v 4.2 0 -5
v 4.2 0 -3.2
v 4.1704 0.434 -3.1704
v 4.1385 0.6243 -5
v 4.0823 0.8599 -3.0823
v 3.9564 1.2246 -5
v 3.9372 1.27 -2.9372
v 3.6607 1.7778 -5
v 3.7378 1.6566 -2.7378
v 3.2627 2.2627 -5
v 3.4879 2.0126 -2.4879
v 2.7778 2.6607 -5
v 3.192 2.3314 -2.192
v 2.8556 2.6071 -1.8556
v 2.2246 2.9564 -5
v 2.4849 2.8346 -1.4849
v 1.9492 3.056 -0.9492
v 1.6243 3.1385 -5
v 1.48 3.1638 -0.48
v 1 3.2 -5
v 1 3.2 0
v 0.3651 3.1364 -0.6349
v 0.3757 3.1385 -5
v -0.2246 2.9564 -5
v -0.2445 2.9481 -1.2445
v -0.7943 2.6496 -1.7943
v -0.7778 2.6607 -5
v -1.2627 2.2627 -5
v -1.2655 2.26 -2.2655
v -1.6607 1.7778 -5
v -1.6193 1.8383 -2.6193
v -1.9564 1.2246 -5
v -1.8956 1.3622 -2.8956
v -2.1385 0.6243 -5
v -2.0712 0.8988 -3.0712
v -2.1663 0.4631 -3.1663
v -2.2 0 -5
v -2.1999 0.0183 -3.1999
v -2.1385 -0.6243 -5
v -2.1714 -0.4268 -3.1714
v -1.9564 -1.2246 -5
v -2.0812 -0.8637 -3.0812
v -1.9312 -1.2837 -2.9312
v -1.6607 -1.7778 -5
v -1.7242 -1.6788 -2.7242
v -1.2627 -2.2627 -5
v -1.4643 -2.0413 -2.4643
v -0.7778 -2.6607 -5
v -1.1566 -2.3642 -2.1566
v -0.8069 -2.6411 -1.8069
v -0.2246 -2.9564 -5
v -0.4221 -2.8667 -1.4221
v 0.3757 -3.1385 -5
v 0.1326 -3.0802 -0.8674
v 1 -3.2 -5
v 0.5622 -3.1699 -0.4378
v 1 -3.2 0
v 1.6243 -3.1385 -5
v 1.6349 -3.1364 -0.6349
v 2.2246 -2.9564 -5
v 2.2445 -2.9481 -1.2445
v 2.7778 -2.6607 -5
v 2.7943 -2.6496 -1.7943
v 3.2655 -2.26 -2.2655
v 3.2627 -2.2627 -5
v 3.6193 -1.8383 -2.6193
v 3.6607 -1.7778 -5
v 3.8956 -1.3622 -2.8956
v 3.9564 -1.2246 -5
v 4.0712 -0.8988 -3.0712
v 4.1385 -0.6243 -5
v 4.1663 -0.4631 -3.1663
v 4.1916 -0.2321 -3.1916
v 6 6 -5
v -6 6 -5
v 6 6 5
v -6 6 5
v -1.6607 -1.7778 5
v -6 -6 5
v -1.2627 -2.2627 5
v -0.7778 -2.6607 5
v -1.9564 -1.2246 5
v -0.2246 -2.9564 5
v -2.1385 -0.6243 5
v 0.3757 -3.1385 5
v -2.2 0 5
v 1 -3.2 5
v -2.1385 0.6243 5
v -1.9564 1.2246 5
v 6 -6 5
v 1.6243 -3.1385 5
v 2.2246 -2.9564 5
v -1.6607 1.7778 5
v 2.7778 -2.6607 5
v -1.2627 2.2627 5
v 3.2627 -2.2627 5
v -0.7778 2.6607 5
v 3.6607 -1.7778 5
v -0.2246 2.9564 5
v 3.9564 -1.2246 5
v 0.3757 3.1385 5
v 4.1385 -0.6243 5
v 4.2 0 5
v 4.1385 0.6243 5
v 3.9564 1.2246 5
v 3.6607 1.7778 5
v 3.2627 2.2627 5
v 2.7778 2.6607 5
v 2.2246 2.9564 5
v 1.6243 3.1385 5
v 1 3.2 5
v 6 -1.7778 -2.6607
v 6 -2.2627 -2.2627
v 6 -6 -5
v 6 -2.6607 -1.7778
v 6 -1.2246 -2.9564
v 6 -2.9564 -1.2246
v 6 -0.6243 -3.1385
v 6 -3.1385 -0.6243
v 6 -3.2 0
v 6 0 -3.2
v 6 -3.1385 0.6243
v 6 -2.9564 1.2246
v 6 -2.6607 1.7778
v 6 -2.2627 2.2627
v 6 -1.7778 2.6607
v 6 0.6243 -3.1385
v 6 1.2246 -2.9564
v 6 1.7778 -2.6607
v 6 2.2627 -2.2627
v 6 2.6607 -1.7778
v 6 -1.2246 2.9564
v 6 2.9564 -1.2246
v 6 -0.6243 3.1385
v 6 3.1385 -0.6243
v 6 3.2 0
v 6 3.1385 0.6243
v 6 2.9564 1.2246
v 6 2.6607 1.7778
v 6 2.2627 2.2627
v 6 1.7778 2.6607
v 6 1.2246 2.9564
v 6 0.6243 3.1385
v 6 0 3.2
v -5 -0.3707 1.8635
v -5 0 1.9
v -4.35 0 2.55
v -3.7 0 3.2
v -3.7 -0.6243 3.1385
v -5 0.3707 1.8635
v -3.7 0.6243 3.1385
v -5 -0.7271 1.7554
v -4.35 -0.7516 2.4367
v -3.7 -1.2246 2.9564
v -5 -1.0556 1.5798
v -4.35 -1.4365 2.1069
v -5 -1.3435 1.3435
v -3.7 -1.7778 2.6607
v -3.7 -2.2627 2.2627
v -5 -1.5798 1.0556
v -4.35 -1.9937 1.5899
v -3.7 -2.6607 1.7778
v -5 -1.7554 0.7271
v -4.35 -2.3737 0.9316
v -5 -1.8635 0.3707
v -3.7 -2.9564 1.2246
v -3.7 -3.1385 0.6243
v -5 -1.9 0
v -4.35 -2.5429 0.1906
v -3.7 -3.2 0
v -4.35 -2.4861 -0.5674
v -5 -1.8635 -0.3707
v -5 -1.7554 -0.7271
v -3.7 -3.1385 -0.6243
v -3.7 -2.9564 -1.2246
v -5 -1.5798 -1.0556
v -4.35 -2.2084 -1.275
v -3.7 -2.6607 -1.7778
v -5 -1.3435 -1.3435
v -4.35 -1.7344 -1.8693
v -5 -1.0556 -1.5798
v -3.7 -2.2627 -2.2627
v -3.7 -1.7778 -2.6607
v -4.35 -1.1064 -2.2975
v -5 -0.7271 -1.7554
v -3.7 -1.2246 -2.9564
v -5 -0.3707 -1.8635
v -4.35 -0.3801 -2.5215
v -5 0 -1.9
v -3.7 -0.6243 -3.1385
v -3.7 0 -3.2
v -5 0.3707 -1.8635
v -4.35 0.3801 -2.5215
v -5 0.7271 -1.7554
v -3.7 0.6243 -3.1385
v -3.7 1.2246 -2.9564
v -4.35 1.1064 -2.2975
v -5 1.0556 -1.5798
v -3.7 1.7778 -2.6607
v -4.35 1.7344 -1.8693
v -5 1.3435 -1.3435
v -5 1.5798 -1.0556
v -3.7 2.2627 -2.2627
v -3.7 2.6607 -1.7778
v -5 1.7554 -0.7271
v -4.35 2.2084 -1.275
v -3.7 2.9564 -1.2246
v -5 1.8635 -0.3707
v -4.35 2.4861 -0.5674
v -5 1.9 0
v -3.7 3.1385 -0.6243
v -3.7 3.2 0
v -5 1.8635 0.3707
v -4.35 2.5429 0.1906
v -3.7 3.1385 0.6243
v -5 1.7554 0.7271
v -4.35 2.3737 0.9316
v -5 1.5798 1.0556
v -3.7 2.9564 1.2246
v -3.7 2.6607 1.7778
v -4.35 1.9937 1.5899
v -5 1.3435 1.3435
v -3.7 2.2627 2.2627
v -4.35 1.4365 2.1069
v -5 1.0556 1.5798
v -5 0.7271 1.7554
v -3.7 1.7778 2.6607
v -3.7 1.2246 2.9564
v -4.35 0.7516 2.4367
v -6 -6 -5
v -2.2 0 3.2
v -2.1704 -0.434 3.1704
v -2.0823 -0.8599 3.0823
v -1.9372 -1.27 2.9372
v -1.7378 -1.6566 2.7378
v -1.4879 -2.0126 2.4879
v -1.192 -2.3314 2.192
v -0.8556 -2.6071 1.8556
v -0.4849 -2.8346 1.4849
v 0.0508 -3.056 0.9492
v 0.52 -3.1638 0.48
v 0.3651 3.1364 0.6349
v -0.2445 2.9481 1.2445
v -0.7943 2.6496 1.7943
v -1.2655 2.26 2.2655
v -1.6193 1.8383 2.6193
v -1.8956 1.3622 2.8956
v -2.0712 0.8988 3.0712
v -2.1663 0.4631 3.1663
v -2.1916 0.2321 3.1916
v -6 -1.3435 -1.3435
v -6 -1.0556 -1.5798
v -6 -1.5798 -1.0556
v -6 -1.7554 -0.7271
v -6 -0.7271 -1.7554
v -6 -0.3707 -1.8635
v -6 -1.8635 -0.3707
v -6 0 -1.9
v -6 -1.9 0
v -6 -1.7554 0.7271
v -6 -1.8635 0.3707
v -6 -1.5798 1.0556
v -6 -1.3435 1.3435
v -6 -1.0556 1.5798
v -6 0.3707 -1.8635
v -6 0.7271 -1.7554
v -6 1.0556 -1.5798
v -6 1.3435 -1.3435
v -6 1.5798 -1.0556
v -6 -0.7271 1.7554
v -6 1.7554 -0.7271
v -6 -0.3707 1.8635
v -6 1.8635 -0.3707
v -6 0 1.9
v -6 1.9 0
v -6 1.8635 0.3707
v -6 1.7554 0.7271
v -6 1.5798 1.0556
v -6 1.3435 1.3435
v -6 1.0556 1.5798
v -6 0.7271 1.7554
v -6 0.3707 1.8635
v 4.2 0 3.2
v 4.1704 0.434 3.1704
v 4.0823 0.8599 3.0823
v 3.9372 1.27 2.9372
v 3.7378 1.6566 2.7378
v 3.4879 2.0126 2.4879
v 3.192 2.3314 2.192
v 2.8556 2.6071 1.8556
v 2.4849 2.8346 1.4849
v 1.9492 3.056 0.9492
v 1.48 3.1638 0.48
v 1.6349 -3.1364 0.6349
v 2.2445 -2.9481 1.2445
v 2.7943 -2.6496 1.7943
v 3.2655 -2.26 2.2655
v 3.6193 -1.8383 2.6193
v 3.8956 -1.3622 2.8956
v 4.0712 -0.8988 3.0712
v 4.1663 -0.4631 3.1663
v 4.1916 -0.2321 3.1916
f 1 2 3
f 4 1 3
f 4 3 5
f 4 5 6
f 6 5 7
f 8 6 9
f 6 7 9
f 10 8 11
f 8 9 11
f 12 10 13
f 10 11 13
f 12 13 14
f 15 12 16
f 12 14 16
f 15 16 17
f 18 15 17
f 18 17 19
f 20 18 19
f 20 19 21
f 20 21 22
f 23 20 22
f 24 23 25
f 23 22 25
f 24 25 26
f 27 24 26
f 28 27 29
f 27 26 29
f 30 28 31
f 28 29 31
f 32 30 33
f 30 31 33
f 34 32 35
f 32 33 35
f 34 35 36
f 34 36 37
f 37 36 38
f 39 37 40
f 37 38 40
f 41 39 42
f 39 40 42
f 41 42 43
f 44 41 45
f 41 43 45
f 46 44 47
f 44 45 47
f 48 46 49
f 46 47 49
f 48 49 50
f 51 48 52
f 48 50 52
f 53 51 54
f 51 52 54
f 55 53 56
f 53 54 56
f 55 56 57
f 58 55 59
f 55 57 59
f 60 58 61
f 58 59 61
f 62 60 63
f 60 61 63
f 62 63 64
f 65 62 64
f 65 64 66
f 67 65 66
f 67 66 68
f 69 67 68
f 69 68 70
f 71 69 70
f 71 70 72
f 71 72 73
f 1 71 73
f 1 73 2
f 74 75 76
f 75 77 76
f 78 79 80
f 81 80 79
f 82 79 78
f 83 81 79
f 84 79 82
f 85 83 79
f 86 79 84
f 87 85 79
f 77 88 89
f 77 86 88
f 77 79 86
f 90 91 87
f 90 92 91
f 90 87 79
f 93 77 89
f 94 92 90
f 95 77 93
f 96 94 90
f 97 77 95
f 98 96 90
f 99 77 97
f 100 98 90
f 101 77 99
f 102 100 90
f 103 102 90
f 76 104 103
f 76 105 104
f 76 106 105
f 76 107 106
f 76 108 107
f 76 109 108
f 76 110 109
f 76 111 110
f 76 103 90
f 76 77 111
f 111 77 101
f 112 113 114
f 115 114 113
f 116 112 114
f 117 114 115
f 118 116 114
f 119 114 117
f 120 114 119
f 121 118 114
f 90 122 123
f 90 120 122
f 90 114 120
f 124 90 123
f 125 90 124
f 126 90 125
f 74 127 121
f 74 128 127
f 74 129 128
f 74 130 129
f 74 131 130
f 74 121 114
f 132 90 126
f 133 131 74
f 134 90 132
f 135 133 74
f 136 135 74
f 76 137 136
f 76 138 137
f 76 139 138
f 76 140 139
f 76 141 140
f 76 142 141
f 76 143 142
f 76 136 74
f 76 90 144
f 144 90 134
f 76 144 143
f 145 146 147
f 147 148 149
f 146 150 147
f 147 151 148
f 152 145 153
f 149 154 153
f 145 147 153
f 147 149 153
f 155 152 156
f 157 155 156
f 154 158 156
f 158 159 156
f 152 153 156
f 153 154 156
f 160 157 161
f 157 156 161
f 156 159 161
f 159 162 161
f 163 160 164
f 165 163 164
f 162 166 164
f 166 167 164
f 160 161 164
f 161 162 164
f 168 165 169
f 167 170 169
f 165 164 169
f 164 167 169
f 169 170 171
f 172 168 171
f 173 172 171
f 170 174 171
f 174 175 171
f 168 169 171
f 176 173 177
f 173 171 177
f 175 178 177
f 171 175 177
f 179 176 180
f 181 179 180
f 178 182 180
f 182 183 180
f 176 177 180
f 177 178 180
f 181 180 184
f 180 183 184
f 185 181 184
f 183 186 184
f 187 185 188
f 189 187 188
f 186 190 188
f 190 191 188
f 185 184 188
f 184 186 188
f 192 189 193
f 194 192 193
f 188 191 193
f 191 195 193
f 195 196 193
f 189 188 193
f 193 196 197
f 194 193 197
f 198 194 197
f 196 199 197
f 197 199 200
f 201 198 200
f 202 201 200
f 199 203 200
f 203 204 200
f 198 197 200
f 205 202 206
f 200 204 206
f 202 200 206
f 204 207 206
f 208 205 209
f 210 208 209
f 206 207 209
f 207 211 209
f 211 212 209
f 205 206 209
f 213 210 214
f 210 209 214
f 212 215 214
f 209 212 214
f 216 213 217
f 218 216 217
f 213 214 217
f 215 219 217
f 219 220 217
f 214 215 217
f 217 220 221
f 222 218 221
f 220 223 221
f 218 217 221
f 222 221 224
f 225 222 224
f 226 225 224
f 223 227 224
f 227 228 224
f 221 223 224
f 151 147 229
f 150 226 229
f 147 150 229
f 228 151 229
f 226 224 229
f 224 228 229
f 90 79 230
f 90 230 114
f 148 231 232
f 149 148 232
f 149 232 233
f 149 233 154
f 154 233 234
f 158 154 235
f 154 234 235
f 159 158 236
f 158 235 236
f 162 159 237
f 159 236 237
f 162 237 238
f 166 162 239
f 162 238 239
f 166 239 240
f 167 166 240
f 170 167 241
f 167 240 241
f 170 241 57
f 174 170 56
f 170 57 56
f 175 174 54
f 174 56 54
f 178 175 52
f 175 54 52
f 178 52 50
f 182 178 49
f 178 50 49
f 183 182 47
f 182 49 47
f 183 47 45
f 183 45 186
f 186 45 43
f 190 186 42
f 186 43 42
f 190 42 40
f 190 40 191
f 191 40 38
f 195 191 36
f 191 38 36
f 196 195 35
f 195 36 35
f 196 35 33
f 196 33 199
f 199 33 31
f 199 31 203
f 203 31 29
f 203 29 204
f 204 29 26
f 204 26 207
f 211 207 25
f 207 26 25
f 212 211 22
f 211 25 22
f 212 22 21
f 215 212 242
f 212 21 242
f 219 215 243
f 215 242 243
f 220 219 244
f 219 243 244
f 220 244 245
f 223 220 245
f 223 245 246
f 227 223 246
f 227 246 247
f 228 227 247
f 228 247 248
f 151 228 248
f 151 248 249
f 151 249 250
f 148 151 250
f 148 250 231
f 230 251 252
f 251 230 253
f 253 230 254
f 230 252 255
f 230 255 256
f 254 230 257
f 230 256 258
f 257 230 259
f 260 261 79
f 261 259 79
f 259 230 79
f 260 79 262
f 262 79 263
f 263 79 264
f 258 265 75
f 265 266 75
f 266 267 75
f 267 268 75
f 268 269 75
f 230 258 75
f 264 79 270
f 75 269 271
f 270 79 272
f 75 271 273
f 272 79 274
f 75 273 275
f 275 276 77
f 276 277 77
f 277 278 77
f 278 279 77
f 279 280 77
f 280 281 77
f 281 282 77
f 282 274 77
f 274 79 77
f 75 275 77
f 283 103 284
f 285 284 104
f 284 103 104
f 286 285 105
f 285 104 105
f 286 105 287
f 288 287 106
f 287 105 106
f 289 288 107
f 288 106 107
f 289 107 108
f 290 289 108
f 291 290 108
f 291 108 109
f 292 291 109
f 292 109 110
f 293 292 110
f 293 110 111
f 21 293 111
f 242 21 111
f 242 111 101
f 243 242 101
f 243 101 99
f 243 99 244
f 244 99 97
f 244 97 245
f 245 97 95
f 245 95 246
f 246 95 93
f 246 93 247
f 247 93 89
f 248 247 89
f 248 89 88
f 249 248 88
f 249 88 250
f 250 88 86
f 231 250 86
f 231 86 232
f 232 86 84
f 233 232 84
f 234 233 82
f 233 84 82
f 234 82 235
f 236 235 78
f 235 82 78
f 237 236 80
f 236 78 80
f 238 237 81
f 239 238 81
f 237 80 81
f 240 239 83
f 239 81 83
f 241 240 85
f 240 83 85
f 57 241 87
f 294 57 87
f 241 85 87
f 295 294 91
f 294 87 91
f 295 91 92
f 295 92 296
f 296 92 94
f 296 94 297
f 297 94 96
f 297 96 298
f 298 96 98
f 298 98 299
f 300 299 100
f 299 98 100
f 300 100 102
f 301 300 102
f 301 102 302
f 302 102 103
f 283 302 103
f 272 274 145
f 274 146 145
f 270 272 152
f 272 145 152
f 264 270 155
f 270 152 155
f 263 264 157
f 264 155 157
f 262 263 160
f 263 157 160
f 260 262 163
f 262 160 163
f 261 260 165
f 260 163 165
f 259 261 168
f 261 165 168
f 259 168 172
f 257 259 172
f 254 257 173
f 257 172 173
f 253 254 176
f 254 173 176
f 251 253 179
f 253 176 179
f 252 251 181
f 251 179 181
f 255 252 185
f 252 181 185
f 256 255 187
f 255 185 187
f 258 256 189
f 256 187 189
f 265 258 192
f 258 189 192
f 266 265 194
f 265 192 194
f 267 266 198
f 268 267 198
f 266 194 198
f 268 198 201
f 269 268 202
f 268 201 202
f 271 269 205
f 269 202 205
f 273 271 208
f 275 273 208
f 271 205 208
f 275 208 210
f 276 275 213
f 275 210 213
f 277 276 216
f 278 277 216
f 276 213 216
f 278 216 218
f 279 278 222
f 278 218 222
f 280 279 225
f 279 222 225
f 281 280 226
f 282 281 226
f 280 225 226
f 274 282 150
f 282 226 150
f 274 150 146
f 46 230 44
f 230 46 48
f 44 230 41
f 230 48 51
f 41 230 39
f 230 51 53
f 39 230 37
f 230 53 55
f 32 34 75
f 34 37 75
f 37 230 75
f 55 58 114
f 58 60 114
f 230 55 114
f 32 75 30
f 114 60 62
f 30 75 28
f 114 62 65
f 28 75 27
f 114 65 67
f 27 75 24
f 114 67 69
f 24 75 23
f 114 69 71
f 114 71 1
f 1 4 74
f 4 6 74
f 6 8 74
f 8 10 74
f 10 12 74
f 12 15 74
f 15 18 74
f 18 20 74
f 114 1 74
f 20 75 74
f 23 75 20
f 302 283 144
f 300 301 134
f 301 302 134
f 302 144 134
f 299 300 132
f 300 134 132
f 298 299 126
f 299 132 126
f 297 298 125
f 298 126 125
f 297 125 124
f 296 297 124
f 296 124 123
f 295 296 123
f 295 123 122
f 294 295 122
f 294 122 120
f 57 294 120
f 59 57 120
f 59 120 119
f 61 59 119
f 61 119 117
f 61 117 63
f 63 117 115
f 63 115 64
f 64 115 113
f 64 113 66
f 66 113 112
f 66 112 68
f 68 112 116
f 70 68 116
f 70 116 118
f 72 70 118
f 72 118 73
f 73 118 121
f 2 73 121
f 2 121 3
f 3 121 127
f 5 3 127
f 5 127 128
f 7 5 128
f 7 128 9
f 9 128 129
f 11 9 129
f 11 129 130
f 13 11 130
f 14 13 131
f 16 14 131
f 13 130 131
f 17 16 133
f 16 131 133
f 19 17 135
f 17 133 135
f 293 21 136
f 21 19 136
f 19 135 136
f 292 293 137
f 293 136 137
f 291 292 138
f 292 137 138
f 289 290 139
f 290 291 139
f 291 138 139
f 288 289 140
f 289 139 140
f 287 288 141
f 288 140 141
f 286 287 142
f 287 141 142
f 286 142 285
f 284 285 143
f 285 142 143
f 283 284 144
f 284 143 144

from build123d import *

# Parameters (mm, degrees)
SKETCH_W     = 12
SKETCH_H     = 12
PAD_DEPTH    = 5
SKETCH001_R  = 3.2
POCKET_DEPTH = 10.001


with BuildPart() as body001:
    # Sketch002 → Revolution (revolve)
    with BuildSketch(Plane.XZ):
        Polygon((-6, 0), (-6, 1.9), (-5, 1.9), (-3.7, 3.2), (6, 3.2), (6, 0), align=None)
    revolve(axis=Axis((0, 0, 0), (1, 0, 0)))


with BuildPart() as cut:
    # Sketch → Pad (new body, symmetric)
    with BuildSketch(Plane.XY):
        Rectangle(SKETCH_W, SKETCH_H)
    extrude(amount=PAD_DEPTH, both=True)

    # Sketch001 (on Face6 of Pad) → Pocket (cut, through all)
    with BuildSketch(Plane.XY.offset(5)):
        with Locations((1, 0)):
            Circle(SKETCH001_R)
    extrude(amount=-POCKET_DEPTH, mode=Mode.SUBTRACT)

    # Cut: cut Body001
    add(body001.part, mode=Mode.SUBTRACT)


solid = cut.part
